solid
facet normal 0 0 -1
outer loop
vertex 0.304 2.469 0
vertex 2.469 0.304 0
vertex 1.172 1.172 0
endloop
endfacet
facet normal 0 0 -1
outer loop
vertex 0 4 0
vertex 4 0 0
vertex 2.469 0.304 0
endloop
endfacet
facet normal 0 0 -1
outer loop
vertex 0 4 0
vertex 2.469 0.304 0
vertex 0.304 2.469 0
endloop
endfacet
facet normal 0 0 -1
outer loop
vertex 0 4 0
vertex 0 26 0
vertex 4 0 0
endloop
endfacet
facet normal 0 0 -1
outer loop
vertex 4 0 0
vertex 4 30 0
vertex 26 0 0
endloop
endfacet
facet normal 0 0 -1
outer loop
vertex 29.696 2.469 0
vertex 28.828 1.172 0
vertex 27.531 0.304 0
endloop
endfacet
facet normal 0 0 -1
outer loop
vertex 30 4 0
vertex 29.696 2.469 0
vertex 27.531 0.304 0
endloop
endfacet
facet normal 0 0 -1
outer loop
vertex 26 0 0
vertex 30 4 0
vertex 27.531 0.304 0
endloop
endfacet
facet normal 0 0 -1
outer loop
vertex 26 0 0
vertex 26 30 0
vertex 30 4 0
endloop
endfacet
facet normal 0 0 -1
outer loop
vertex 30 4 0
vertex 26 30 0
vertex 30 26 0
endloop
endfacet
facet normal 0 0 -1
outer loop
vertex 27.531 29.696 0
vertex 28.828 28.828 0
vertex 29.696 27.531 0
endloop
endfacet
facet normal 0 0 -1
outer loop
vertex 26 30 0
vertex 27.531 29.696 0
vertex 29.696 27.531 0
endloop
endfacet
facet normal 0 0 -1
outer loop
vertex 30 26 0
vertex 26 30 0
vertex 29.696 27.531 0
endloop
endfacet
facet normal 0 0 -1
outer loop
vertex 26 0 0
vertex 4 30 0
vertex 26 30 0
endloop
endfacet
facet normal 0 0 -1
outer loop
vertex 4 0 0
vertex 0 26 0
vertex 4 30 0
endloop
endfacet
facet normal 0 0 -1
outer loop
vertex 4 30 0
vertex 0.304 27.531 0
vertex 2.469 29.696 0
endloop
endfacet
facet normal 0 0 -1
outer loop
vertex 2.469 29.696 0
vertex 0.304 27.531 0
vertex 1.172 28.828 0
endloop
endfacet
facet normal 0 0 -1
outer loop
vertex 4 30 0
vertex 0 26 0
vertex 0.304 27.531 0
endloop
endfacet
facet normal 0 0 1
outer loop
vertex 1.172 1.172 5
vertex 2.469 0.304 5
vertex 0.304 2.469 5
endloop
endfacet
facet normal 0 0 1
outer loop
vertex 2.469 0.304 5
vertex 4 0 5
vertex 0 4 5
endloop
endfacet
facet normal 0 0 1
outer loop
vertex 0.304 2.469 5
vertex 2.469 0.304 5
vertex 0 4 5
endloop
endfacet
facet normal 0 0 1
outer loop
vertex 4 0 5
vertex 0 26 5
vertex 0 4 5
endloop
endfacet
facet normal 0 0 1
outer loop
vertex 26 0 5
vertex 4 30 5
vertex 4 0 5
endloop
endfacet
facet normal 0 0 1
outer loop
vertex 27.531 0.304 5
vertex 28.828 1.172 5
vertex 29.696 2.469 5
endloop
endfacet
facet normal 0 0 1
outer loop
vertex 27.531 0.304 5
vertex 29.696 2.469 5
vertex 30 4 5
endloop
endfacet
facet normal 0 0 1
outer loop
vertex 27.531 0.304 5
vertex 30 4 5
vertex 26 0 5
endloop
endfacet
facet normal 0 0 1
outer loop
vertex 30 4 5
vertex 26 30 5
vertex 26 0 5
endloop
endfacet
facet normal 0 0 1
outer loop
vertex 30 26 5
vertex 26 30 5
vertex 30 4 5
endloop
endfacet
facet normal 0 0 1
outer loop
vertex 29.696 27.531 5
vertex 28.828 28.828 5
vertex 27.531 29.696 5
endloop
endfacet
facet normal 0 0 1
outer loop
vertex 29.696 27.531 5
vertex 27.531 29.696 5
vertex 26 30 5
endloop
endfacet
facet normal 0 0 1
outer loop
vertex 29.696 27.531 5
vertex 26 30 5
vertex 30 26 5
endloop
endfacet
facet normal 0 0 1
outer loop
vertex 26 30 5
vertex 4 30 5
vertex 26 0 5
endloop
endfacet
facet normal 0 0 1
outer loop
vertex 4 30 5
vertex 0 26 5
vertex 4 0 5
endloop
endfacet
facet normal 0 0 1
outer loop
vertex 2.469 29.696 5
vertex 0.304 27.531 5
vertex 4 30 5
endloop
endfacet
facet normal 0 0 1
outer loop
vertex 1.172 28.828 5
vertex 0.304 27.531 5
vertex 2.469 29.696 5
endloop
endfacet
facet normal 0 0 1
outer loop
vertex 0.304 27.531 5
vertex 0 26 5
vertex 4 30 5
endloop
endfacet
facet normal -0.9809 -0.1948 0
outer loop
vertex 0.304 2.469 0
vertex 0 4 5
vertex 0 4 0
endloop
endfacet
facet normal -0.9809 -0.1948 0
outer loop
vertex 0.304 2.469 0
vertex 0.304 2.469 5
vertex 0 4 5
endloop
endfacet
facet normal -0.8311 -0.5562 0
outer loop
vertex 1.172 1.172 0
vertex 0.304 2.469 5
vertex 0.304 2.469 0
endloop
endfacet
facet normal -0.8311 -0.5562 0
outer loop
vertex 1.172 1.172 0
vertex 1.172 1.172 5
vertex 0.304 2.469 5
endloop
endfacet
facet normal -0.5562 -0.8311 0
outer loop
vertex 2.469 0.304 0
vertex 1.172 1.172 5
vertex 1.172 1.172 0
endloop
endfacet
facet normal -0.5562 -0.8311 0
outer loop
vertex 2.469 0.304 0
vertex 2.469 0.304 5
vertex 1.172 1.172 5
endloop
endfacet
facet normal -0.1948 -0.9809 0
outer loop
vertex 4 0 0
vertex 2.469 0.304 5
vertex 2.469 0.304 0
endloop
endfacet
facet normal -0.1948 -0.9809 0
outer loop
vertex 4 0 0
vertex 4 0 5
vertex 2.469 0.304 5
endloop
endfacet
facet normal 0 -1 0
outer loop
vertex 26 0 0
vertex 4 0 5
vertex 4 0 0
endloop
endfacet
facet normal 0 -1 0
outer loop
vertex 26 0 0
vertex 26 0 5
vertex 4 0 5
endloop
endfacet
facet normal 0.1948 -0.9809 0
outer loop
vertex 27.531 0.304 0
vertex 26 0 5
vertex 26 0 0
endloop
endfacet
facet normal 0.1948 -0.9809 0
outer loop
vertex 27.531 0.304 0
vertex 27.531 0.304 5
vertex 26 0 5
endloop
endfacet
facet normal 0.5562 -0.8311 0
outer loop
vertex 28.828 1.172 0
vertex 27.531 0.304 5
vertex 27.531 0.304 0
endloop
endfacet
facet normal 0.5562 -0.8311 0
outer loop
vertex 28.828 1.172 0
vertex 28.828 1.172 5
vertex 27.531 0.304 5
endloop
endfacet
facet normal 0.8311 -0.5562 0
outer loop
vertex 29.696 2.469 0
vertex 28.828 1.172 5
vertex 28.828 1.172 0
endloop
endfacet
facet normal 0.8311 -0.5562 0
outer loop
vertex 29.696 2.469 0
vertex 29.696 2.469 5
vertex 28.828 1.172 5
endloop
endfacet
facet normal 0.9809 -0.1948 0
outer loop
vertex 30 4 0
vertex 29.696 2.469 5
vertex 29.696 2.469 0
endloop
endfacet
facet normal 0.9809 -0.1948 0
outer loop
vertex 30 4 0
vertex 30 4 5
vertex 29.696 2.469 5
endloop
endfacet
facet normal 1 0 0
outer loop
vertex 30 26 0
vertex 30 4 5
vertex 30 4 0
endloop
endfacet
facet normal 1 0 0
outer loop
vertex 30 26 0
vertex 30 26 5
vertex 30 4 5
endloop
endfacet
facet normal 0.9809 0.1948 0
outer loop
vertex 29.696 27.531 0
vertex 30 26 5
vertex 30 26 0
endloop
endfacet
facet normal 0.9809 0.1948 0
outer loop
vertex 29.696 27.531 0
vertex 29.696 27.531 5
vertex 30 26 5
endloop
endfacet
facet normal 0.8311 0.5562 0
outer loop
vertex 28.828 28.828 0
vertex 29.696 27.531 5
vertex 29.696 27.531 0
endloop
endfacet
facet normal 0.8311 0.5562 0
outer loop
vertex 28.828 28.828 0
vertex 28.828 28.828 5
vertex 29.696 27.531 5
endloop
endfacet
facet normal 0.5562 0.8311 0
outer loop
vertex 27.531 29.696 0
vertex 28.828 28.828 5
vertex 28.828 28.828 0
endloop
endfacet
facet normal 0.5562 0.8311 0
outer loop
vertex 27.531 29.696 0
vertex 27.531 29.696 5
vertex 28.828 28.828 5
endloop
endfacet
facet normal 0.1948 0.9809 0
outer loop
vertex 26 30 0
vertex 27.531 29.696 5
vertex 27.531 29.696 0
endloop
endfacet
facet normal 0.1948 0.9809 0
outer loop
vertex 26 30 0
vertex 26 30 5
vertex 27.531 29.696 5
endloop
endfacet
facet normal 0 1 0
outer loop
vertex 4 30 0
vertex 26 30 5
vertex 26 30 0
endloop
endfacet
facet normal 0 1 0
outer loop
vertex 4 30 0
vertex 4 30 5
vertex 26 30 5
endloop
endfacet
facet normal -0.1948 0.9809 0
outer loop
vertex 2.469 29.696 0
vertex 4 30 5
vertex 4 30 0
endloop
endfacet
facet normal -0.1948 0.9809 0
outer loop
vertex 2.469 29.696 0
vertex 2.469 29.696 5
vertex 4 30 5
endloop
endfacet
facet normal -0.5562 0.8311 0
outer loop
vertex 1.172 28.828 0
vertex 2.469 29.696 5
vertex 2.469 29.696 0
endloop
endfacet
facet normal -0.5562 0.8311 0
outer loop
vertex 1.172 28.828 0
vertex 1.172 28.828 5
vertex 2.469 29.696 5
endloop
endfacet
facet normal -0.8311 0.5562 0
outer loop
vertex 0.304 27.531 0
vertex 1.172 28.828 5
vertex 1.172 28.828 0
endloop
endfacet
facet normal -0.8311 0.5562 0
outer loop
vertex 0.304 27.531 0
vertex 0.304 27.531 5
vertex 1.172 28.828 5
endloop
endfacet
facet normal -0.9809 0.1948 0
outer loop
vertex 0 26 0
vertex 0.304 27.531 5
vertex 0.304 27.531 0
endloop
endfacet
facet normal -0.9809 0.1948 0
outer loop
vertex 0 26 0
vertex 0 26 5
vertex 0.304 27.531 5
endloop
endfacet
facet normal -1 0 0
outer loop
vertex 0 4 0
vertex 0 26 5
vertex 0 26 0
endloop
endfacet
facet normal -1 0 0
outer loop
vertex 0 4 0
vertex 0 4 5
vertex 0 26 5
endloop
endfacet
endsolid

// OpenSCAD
// file: roundedsquare.scad
module roundedSquare(size=[10,10], radius=1, center=false, $fn=16) {
    size1 = (size+0==size) ? [size,size] : size;
    if (radius <= 0) {
        square(size1, center=center);
    }
    else {
        translate(center ? -size1/2 : [0,0])
        hull() {
            translate([radius,radius]) circle(r=radius);
            translate([size1[0]-radius,radius]) circle(r=radius);
            translate([size1[0]-radius,size1[1]-radius]) circle(r=radius);
            translate([radius,size1[1]-radius]) circle(r=radius);
        }
    }
}

module roundedCube(size=[10,10,10], radius=1, center=false, $fn=16) {
    linear_extrude(height=size[2])
    roundedSquare(size=[size[0],size[1]], radius=radius, center=center);
}

module roundedOpenTopBox(size=[10,10,10], radius=2, wall=1, solid=false) {
    render(convexity=2)
    difference() {
        linear_extrude(height=size[2]) roundedSquare(size=[size[0],size[1]], radius=radius);
        if (!solid) {
            translate([0,0,wall])
            linear_extrude(height=size[2]-wall) 
            translate([wall,wall]) roundedSquare(size=[size[0]-2*wall,size[1]-2*wall], radius=radius-wall);
        }
    }
}
// main file
use <roundedsquare.scad>;

w=30;
rounded=4;
h=5;

$fn = 16;
linear_extrude(height=h) roundedSquare(w, radius=rounded);
